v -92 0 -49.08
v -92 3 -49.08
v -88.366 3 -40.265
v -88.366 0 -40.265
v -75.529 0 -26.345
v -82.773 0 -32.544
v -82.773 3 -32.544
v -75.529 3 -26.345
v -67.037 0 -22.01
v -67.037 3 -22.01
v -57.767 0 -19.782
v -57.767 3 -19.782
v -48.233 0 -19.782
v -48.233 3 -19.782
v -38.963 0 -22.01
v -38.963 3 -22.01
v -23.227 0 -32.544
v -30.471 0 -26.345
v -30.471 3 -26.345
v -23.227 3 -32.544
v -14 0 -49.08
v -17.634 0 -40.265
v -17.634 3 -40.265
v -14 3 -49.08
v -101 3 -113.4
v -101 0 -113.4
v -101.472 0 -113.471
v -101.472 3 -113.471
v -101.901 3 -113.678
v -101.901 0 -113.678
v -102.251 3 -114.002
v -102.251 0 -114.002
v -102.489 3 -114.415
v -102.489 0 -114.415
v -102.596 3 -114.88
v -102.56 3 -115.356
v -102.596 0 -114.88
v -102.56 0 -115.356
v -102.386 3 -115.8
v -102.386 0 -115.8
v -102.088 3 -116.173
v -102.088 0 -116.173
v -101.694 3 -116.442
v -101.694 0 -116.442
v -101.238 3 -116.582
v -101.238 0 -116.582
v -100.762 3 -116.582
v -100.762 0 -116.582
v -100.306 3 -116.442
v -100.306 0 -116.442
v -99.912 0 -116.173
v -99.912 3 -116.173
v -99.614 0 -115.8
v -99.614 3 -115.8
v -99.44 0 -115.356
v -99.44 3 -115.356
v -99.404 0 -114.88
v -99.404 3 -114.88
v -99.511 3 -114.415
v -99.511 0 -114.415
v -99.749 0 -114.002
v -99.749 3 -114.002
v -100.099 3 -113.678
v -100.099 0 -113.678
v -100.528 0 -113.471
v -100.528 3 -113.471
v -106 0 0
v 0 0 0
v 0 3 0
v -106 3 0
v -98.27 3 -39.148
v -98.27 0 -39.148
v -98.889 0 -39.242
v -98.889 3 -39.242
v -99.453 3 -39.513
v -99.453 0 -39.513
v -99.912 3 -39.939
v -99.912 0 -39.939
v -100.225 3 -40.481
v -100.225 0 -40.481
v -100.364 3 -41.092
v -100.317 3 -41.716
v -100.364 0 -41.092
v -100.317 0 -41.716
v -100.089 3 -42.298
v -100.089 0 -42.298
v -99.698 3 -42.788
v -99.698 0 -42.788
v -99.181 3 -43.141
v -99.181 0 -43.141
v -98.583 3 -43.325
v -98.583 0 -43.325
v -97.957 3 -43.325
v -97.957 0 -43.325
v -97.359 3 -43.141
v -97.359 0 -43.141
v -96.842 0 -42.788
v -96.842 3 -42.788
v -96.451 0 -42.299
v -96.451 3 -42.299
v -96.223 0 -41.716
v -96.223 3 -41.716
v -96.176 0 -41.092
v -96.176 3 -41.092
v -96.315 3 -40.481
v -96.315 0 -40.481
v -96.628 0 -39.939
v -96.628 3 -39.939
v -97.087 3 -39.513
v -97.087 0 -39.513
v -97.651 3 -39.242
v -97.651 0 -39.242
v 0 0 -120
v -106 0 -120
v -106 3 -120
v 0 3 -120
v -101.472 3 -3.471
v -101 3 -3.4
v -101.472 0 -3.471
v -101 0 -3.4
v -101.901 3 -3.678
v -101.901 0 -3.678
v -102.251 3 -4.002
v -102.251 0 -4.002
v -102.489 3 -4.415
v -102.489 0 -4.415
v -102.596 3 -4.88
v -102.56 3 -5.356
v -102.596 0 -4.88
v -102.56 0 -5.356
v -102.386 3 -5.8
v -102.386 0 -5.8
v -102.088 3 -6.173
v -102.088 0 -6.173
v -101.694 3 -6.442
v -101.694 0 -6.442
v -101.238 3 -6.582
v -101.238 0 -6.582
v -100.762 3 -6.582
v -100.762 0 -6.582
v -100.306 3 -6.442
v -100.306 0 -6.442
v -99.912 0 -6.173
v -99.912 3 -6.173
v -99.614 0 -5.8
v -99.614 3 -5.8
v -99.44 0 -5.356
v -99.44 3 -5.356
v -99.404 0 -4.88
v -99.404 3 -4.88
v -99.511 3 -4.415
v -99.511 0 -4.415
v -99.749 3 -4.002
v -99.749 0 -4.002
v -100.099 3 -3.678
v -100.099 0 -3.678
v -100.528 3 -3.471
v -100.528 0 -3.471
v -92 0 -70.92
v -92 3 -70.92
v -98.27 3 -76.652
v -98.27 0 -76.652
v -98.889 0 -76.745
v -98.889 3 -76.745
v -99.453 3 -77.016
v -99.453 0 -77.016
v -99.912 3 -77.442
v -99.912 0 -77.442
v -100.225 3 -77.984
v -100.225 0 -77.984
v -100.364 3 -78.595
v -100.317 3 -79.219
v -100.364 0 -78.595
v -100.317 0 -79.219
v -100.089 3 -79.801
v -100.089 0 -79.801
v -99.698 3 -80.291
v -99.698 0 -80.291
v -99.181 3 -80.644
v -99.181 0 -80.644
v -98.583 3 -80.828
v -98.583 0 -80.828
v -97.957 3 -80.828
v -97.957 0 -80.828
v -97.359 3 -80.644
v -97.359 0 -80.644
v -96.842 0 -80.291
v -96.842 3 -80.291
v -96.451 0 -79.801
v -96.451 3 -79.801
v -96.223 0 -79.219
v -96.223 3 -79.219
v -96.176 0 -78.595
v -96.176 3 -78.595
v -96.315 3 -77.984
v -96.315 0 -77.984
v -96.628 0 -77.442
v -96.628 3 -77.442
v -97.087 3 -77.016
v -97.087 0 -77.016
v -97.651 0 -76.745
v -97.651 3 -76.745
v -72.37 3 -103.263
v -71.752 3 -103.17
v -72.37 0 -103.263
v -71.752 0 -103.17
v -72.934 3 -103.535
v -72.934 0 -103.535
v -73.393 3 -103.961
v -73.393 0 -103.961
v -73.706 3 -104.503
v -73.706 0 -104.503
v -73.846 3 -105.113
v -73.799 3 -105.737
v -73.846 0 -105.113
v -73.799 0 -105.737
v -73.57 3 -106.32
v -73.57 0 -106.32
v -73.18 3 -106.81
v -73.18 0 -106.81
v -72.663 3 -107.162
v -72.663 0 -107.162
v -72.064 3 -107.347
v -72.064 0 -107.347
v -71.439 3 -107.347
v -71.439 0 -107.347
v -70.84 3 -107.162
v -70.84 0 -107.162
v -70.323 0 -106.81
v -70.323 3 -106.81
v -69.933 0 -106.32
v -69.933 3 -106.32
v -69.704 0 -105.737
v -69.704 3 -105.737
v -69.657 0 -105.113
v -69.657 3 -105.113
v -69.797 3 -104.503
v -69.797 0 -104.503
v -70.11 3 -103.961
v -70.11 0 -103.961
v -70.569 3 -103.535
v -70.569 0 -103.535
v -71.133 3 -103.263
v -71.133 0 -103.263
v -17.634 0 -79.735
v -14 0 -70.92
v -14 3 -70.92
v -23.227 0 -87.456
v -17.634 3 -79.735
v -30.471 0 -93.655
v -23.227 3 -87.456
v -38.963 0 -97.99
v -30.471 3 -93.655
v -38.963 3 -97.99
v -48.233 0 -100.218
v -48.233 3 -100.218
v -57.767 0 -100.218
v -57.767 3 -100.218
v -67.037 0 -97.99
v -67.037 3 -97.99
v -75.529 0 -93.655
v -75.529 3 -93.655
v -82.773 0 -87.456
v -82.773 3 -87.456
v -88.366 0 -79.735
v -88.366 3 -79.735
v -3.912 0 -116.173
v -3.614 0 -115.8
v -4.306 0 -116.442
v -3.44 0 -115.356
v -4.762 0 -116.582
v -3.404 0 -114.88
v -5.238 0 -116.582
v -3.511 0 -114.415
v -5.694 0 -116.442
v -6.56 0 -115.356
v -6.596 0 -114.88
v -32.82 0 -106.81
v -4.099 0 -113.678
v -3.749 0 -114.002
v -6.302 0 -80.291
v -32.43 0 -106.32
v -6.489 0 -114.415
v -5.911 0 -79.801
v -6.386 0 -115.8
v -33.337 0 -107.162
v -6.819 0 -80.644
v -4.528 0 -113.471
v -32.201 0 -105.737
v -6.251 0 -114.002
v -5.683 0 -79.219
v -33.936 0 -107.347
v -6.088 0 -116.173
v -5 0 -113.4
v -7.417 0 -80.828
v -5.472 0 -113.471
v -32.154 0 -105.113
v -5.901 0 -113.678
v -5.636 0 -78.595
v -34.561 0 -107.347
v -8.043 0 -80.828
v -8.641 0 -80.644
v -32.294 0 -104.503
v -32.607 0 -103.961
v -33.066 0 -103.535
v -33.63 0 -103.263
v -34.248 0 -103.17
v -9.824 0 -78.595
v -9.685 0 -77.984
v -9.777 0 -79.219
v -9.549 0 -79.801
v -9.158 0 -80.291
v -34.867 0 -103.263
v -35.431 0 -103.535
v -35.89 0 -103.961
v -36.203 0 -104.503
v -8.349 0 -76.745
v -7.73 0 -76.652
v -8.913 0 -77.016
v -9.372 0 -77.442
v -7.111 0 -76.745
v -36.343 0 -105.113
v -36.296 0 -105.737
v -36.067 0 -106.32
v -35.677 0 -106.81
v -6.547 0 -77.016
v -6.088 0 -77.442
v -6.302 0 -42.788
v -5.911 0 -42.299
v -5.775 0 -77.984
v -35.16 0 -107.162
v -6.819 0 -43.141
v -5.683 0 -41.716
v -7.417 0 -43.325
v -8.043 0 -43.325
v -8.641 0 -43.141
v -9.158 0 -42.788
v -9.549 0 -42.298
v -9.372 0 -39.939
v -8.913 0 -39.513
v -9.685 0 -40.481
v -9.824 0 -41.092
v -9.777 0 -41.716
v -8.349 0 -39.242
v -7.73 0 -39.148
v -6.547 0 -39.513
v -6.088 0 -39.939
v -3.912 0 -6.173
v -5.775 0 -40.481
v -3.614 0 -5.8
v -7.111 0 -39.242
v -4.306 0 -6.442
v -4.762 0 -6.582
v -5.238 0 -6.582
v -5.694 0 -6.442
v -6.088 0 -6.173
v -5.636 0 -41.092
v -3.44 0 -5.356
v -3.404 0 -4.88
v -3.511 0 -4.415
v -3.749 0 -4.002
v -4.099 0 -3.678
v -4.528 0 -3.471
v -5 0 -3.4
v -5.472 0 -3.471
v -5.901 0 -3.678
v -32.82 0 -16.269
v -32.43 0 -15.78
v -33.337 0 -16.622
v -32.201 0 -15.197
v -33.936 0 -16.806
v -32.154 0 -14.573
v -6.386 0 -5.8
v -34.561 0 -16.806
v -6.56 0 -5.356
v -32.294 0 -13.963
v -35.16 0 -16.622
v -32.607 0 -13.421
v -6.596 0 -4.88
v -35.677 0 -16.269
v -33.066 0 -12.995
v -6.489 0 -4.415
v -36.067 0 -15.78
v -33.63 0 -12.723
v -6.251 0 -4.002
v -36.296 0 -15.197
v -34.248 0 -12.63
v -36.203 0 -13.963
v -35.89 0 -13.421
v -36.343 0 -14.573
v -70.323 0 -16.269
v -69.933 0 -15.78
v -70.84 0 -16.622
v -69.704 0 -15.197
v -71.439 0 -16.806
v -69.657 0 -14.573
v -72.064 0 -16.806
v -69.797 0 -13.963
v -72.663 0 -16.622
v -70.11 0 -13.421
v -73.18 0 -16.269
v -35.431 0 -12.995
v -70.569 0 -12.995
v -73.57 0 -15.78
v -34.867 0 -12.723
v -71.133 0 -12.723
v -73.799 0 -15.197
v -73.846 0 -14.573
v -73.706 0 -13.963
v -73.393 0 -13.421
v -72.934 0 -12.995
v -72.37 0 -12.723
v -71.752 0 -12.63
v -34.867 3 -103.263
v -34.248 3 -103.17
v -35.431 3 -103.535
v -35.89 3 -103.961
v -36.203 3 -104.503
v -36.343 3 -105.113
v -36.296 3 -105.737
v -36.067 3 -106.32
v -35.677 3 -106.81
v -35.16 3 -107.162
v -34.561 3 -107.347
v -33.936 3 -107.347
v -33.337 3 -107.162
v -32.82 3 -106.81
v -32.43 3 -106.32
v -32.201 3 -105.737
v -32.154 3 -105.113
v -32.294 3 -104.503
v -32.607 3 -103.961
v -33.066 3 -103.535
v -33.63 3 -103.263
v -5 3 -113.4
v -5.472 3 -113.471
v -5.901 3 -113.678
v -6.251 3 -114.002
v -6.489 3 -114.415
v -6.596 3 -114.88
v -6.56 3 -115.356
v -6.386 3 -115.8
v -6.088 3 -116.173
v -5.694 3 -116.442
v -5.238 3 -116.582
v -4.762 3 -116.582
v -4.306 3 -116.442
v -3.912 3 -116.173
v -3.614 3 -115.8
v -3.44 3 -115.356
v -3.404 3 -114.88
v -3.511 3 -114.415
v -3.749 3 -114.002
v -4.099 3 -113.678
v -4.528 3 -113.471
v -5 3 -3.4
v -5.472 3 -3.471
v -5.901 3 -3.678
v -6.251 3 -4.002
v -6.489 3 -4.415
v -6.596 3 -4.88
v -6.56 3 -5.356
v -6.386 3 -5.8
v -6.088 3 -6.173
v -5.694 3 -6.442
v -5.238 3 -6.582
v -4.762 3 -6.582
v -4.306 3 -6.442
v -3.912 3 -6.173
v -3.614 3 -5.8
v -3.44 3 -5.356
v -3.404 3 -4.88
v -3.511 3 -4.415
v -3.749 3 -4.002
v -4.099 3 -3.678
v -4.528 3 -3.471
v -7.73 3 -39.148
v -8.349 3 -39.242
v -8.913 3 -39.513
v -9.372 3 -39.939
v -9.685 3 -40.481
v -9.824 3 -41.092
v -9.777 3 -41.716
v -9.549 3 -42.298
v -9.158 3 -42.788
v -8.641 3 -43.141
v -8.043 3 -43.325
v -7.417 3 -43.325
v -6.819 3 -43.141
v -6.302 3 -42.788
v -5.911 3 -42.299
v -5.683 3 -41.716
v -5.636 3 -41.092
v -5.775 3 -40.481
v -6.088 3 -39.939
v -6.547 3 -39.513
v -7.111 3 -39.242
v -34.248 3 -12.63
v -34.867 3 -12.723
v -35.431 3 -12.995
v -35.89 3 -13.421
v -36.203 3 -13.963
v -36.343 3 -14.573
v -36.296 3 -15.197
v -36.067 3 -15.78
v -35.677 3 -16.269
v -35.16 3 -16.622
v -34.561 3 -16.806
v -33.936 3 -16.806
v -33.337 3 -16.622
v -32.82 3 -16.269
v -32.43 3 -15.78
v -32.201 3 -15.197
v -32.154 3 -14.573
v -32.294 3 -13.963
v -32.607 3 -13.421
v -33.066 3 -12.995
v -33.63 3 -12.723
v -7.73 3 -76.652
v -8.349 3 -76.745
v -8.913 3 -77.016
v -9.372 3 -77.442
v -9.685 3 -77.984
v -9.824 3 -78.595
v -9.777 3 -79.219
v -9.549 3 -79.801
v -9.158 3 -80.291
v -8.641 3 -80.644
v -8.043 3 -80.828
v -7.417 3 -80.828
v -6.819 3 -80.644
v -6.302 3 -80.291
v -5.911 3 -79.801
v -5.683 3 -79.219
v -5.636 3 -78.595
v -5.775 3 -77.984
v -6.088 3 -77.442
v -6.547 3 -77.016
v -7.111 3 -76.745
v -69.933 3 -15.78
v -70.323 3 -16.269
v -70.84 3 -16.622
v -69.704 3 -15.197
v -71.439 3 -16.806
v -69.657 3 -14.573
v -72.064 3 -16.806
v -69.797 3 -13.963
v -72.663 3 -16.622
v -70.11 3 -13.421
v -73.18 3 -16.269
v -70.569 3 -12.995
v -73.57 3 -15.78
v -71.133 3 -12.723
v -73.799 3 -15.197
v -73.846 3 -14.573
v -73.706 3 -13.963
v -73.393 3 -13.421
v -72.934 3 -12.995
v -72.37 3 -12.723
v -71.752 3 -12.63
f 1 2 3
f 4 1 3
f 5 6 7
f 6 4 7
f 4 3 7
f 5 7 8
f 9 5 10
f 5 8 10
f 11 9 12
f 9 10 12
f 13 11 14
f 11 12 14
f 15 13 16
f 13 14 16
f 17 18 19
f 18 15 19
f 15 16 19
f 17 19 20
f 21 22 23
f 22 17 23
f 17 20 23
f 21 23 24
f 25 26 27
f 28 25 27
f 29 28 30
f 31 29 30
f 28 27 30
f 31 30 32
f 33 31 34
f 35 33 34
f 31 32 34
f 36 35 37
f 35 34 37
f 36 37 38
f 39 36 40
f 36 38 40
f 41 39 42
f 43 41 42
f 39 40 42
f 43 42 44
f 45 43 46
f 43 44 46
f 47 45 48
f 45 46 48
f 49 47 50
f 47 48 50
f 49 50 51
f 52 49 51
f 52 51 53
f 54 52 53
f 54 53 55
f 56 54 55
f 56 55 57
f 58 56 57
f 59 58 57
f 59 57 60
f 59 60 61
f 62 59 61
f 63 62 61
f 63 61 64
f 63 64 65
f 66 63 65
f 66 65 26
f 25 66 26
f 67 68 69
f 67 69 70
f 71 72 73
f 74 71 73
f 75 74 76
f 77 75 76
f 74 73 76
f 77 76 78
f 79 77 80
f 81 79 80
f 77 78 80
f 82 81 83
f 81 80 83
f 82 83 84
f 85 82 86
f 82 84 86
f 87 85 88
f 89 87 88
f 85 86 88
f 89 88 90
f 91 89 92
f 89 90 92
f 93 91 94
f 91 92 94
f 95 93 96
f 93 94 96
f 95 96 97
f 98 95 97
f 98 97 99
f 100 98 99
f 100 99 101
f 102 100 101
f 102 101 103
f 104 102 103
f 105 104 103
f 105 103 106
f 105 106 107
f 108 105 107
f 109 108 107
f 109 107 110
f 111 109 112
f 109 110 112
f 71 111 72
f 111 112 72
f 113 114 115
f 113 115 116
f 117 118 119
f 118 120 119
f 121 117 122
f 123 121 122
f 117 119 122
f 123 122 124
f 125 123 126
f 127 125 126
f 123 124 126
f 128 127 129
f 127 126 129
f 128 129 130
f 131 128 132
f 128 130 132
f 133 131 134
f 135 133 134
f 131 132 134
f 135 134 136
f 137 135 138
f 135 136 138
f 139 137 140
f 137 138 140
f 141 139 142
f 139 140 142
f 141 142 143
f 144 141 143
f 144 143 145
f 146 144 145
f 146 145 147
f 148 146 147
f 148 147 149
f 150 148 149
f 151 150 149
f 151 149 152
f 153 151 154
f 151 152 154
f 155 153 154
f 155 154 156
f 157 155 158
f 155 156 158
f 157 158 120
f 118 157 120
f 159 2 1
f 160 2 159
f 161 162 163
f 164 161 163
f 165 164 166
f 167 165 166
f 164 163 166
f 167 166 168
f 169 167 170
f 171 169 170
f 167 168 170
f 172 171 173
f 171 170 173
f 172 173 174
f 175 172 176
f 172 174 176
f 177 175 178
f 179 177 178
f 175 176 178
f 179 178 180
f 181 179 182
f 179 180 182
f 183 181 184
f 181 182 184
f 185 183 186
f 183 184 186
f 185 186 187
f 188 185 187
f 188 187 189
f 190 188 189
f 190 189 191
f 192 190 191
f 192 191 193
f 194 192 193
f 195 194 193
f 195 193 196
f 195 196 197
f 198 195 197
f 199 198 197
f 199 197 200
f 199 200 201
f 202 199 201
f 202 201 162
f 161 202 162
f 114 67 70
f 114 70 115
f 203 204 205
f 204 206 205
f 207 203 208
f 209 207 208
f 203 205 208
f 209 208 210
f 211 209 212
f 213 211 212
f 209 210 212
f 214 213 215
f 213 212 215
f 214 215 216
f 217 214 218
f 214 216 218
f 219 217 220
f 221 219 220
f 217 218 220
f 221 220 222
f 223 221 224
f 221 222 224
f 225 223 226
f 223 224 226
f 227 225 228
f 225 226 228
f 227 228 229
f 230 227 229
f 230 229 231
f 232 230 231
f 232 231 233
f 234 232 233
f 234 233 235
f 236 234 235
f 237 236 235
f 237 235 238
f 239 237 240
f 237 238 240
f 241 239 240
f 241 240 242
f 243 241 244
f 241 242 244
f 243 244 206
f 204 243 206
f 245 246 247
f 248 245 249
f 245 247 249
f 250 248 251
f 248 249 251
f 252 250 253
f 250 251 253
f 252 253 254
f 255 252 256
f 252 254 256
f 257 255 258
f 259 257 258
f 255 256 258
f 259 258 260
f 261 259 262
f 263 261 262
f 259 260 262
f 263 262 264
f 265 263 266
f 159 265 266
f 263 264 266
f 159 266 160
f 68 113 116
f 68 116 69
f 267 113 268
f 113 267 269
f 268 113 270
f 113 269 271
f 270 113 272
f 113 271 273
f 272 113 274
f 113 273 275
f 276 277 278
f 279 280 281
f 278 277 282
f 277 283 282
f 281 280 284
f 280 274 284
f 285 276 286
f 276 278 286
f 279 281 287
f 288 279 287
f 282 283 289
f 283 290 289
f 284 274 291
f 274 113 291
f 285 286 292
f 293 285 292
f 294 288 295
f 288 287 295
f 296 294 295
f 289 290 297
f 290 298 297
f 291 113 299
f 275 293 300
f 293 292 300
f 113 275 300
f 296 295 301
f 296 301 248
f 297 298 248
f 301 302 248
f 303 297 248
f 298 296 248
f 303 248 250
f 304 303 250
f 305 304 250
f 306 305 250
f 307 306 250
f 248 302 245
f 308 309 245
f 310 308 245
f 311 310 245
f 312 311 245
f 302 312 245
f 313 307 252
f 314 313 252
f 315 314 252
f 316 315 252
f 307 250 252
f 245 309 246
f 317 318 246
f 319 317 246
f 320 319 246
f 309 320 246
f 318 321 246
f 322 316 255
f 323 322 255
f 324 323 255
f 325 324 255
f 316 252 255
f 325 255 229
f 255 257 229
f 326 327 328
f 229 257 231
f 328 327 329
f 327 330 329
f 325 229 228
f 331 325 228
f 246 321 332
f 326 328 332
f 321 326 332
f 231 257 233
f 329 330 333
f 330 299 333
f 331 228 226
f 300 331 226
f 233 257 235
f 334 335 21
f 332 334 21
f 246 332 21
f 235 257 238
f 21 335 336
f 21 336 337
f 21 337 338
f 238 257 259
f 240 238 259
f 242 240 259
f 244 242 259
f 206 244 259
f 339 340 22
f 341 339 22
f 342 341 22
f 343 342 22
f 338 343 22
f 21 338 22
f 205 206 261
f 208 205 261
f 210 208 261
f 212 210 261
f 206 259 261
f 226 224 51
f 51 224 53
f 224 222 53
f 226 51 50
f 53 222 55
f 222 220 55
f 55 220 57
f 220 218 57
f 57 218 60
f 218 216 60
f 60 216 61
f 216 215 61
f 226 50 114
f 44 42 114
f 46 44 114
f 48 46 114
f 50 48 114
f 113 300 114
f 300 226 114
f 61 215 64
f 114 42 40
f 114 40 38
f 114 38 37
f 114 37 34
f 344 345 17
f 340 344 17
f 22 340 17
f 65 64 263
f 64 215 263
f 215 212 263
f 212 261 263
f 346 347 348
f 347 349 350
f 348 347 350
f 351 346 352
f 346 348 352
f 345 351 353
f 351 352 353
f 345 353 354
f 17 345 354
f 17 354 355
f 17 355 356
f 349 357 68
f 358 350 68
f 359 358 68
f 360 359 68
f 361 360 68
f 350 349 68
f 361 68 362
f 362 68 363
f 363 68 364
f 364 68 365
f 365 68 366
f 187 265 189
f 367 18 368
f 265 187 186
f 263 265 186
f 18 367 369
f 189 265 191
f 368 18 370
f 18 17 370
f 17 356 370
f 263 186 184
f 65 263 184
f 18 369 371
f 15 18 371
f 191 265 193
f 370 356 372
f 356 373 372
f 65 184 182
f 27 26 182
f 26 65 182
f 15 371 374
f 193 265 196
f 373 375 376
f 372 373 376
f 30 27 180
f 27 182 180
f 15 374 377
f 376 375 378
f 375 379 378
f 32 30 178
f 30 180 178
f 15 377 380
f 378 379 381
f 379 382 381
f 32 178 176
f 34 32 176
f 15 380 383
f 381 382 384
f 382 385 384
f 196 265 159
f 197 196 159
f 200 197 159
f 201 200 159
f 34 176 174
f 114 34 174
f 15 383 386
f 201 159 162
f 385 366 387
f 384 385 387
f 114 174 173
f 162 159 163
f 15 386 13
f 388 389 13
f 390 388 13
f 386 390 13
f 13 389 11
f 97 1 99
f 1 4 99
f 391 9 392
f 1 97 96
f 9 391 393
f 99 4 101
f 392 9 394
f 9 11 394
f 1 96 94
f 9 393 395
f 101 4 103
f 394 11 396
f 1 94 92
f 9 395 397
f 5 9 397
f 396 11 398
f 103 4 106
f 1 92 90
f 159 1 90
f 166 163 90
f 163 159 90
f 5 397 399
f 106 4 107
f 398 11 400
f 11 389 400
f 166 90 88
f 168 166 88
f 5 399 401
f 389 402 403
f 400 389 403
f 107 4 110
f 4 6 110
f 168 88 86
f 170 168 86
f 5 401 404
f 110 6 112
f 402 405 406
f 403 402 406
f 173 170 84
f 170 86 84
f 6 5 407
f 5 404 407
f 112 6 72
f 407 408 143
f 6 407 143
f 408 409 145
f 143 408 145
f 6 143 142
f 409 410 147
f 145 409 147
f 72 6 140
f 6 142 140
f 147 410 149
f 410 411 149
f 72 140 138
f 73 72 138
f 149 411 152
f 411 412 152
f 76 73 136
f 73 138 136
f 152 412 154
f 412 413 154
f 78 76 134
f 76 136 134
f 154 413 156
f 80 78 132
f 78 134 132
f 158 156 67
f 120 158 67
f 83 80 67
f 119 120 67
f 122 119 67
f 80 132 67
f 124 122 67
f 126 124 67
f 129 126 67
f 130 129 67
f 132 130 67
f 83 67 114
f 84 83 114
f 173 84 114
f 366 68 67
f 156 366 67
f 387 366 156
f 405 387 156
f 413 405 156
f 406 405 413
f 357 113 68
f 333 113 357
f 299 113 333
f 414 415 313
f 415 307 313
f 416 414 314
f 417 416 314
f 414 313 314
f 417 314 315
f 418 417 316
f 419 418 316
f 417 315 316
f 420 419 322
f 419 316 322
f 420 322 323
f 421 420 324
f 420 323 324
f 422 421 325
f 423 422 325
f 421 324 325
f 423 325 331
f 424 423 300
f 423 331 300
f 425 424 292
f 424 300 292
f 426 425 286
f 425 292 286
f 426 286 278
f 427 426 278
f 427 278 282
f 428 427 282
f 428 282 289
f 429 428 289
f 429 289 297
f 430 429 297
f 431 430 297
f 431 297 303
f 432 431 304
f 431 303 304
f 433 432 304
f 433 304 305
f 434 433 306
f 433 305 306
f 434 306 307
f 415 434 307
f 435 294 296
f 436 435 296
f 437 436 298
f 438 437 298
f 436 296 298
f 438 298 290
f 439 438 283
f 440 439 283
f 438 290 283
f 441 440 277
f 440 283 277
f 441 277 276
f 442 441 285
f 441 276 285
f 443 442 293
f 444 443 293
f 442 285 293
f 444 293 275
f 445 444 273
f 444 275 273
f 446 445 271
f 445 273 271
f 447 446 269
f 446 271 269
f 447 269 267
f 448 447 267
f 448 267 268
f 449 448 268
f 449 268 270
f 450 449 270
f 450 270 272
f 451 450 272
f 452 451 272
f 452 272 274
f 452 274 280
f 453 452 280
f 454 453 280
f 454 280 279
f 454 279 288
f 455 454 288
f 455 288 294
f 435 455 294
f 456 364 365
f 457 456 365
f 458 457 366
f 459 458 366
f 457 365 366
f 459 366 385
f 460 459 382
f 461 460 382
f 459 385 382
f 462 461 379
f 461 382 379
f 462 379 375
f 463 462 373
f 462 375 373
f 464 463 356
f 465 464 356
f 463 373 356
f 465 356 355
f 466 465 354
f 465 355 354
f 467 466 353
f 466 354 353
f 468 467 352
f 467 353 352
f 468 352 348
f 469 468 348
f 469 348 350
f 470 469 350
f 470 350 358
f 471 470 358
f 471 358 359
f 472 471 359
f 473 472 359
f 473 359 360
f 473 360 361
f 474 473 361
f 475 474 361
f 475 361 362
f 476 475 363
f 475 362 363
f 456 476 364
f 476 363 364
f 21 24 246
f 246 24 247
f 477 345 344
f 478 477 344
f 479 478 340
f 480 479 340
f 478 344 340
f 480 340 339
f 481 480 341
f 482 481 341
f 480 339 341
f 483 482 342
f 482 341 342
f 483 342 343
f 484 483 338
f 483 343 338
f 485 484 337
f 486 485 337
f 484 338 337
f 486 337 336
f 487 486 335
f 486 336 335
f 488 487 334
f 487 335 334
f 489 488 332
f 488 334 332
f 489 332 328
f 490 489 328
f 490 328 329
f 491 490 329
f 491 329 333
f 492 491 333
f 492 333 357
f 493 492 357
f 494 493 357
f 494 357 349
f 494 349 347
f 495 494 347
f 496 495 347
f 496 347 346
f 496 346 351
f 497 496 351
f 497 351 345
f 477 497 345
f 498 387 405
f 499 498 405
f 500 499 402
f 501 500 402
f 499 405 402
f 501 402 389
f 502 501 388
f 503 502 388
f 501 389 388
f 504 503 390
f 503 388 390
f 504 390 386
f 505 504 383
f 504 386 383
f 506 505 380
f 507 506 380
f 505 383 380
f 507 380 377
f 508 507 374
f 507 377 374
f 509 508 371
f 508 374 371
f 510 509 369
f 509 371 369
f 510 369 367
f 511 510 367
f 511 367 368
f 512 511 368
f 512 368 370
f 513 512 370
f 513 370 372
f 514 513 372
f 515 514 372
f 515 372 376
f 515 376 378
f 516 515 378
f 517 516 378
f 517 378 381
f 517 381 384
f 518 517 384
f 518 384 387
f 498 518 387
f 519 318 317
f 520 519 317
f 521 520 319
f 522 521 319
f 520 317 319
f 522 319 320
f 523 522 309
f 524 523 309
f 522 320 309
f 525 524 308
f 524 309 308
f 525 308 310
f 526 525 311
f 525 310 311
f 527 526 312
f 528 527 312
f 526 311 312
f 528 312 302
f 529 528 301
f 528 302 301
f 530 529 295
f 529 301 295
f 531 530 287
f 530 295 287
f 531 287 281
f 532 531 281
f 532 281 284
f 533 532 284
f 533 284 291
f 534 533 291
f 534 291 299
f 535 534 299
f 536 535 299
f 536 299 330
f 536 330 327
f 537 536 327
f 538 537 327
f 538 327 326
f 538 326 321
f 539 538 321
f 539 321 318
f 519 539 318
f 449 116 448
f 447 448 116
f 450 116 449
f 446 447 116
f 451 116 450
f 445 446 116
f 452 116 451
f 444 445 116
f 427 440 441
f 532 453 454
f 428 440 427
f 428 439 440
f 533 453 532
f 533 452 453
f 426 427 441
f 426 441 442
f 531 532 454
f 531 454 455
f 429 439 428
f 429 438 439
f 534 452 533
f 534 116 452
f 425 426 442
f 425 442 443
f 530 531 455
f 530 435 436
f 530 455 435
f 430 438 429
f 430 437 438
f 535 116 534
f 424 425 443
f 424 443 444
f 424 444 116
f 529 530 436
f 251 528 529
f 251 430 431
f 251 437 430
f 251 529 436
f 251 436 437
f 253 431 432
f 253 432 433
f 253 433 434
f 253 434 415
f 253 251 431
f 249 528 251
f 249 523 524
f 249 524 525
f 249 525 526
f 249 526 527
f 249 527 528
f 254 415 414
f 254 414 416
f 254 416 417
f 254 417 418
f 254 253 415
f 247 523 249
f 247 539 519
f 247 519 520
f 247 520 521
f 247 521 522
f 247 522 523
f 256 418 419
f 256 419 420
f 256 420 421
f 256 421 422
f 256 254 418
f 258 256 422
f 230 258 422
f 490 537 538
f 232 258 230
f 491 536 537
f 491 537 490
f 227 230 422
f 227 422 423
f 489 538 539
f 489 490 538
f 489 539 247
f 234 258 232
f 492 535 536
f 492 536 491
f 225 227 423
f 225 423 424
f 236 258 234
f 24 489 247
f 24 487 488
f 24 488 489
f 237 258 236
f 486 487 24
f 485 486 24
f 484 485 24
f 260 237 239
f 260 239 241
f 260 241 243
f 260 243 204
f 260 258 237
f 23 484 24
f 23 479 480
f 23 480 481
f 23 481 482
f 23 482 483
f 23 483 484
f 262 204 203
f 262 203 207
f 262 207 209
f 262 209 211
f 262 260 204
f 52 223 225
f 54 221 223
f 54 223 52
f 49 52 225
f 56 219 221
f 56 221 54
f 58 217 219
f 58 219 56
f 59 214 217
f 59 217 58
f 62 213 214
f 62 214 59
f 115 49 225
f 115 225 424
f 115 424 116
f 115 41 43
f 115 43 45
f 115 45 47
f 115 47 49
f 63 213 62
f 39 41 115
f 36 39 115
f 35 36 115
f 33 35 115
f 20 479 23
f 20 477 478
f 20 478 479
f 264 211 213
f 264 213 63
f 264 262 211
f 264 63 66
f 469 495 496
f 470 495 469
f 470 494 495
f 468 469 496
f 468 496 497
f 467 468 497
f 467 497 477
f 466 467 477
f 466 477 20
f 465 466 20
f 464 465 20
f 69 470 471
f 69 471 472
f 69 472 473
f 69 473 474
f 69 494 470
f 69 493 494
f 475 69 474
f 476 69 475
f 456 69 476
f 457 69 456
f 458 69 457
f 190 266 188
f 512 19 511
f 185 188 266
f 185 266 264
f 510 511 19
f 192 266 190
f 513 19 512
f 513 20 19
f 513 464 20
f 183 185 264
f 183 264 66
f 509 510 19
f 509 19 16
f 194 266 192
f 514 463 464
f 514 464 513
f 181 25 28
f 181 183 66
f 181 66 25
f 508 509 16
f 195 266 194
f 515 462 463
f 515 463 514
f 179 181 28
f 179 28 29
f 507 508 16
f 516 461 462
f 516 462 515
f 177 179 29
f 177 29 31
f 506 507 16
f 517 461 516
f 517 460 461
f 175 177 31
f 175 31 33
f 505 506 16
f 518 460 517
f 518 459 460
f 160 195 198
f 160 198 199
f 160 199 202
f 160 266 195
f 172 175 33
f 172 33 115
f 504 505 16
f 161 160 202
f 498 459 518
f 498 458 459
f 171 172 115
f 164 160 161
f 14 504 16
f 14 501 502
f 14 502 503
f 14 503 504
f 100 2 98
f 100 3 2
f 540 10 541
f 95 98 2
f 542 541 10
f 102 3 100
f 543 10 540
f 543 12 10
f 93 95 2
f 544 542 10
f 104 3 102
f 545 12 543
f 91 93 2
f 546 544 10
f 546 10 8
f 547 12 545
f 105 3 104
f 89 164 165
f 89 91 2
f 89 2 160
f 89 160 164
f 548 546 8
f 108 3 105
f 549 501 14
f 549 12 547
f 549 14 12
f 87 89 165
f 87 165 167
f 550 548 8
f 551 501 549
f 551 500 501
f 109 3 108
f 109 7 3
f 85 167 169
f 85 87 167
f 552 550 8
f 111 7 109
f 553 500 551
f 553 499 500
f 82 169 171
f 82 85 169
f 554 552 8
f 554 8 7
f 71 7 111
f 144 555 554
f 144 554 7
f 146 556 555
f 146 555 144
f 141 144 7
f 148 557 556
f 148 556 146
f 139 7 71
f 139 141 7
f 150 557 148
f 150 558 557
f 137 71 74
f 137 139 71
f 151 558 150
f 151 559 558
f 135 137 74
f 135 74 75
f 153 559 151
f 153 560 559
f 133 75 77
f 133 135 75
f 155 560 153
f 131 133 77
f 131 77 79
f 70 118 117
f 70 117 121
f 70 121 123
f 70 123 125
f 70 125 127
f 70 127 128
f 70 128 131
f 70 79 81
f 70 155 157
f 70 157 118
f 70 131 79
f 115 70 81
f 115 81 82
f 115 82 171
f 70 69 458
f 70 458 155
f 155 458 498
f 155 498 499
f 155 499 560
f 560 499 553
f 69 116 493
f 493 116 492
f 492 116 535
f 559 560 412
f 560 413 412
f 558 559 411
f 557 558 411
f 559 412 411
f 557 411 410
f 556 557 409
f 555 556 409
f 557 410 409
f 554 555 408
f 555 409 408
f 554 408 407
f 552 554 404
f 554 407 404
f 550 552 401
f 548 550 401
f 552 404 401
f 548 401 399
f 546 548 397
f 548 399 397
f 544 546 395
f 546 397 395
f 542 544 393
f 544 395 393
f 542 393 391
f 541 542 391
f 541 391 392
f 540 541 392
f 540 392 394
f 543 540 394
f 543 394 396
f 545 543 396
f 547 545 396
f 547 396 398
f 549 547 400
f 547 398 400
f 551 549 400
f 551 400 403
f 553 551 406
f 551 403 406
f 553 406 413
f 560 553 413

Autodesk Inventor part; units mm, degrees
ref_plane "YZ Plane" through (0, 0, 0) normal (1, 0, 0) x (0, 1, 0)
ref_plane "XZ Plane" through (0, 0, 0) normal (0, 1, 0) x (-1, 0, 0)
ref_plane "XY Plane" through (0, 0, 0) normal (0, 0, 1) x (1, 0, 0)
sketch "スケッチ1" plane through (0, 0, 0) normal (0, 1, 0) x (-1, 0, 0)
  line L0 (0, 0) -> (106, 0)
  line L1 (106, 0) -> (106, -120)
  line L2 (106, -120) -> (0, -120)
  line L3 (0, -120) -> (0, 0)
  dimension "d0" = 106
  dimension "d1" = 120
extrude "押し出し1" add sketch "スケッチ1" along normal blind 3
sketch "スケッチ2" plane through (0, 3, 0) normal (0, 1, 0) x (1, 0, 0)
  line L0 (-106, 120) -> (-106, 0) projected
  line L1 (0, 120) -> (-106, 120) projected
  line L2 (-106, 0) -> (0, 120)
  circle A0 centre (-53, 60) radius 49
  line L3 (-106, 60) -> (0, 60)
  line L4 (0, 0) -> (0, 120) projected
  line L5 (-53, 60) -> (-7.7299, 78.7515)
  point P0 (-34.2485, 105.2701)
  point P1 (-71.7515, 105.2701)
  point P2 (-98.2701, 78.7515)
  point P3 (-98.2701, 41.2485)
  point P4 (-71.7515, 14.7299)
  point P5 (-34.2485, 14.7299)
  point P6 (-7.7299, 41.2485)
  dimension "d4" = 98
  dimension "d5" = 22.5
  dimension "d8" = 360
hole "穴1" at (-7.7299, 3, -78.7515) at (-34.2485, 3, -105.2701) at (-71.7515, 3, -105.2701) at (-98.2701, 3, -78.7515) at (-98.2701, 3, -41.2485) at (-71.7515, 3, -14.7299) at (-34.2485, 3, -14.7299) at (-7.7299, 3, -41.2485) direction (0, -1, 0) diameter 4.2 end through all
sketch "スケッチ3" plane through (0, 3, 0) normal (0, 1, 0) x (1, 0, 0)
  line L0 (-106, 120) -> (-106, 0) projected
  line L1 (0, 120) -> (-106, 120) projected
  line L2 (-106, 0) -> (0, 120)
  circle A0 centre (-53, 60) radius 40.5
  line L3 (-106, 0) -> (0, 0) projected
  line L4 (-92, 0) -> (-92, 120)
  line L5 (-14, 0) -> (-14, 120)
  point P0 (-14, 60)
  point P1 (-92, 70.9202)
  point P2 (-92, 49.0798)
  point P3 (-14, 49.0798)
  point P4 (-14, 70.9202)
  dimension "d17" = 81
  dimension "d20" = 39
  dimension "d21" = 39
extrude "押し出し2" cut sketch "スケッチ3" against normal blind 3 contours A0 L2 L4 | L2 A0 L5 picked at (-69.0671, 72.6536) picked at (-40, 56.3599)
sketch "スケッチ4" plane through (0, 3, 0) normal (0, 1, 0) x (1, 0, 0)
  line L0 (-106, 120) -> (-106, 0) projected
  line L1 (-106, 5) -> (0, 5)
  line L2 (0, 0) -> (0, 120) projected
  line L3 (-120, 115) -> (0, 115)
  line L4 (-106, 0) -> (0, 0) projected
  line L5 (0, 120) -> (-106, 120) projected
  line L6 (-106, 0) -> (0, 0) projected
  line L7 (-101, 0) -> (-101, 120)
  line L8 (-5, 120) -> (-5, 0)
  point P0 (-101, 5)
  point P1 (-5, 5)
  point P2 (-5, 115)
  point P3 (-101, 115)
  dimension "d22" = 5
  dimension "d23" = 5
  dimension "d24" = 5
  dimension "d25" = 5
hole "穴2" at (-101, 3, -5) at (-5, 3, -5) at (-5, 3, -115) at (-101, 3, -115) direction (0, -1, 0) diameter 3.2 end through all
equation "\"d15\" = Thickness"
equation "\"BendRadius\" = Thickness"
equation "\"BendReliefWidth\" = Thickness"
equation "\"BendReliefDepth\" = 0.5 * Thickness"
equation "\"CornerReliefSize\" = 4 * Thickness"
equation "\"MinimumRemnant\" = 2 * Thickness"
equation "\"TransitionRadius\" = BendRadius"
equation "\"JacobiRadiusSize\" = BendRadius"
equation "\"GapSize\" = Thickness"
equation "\"Thickness\" = 0.5"
properties part number "link2_plate2" material "アルミニウム 6061"
